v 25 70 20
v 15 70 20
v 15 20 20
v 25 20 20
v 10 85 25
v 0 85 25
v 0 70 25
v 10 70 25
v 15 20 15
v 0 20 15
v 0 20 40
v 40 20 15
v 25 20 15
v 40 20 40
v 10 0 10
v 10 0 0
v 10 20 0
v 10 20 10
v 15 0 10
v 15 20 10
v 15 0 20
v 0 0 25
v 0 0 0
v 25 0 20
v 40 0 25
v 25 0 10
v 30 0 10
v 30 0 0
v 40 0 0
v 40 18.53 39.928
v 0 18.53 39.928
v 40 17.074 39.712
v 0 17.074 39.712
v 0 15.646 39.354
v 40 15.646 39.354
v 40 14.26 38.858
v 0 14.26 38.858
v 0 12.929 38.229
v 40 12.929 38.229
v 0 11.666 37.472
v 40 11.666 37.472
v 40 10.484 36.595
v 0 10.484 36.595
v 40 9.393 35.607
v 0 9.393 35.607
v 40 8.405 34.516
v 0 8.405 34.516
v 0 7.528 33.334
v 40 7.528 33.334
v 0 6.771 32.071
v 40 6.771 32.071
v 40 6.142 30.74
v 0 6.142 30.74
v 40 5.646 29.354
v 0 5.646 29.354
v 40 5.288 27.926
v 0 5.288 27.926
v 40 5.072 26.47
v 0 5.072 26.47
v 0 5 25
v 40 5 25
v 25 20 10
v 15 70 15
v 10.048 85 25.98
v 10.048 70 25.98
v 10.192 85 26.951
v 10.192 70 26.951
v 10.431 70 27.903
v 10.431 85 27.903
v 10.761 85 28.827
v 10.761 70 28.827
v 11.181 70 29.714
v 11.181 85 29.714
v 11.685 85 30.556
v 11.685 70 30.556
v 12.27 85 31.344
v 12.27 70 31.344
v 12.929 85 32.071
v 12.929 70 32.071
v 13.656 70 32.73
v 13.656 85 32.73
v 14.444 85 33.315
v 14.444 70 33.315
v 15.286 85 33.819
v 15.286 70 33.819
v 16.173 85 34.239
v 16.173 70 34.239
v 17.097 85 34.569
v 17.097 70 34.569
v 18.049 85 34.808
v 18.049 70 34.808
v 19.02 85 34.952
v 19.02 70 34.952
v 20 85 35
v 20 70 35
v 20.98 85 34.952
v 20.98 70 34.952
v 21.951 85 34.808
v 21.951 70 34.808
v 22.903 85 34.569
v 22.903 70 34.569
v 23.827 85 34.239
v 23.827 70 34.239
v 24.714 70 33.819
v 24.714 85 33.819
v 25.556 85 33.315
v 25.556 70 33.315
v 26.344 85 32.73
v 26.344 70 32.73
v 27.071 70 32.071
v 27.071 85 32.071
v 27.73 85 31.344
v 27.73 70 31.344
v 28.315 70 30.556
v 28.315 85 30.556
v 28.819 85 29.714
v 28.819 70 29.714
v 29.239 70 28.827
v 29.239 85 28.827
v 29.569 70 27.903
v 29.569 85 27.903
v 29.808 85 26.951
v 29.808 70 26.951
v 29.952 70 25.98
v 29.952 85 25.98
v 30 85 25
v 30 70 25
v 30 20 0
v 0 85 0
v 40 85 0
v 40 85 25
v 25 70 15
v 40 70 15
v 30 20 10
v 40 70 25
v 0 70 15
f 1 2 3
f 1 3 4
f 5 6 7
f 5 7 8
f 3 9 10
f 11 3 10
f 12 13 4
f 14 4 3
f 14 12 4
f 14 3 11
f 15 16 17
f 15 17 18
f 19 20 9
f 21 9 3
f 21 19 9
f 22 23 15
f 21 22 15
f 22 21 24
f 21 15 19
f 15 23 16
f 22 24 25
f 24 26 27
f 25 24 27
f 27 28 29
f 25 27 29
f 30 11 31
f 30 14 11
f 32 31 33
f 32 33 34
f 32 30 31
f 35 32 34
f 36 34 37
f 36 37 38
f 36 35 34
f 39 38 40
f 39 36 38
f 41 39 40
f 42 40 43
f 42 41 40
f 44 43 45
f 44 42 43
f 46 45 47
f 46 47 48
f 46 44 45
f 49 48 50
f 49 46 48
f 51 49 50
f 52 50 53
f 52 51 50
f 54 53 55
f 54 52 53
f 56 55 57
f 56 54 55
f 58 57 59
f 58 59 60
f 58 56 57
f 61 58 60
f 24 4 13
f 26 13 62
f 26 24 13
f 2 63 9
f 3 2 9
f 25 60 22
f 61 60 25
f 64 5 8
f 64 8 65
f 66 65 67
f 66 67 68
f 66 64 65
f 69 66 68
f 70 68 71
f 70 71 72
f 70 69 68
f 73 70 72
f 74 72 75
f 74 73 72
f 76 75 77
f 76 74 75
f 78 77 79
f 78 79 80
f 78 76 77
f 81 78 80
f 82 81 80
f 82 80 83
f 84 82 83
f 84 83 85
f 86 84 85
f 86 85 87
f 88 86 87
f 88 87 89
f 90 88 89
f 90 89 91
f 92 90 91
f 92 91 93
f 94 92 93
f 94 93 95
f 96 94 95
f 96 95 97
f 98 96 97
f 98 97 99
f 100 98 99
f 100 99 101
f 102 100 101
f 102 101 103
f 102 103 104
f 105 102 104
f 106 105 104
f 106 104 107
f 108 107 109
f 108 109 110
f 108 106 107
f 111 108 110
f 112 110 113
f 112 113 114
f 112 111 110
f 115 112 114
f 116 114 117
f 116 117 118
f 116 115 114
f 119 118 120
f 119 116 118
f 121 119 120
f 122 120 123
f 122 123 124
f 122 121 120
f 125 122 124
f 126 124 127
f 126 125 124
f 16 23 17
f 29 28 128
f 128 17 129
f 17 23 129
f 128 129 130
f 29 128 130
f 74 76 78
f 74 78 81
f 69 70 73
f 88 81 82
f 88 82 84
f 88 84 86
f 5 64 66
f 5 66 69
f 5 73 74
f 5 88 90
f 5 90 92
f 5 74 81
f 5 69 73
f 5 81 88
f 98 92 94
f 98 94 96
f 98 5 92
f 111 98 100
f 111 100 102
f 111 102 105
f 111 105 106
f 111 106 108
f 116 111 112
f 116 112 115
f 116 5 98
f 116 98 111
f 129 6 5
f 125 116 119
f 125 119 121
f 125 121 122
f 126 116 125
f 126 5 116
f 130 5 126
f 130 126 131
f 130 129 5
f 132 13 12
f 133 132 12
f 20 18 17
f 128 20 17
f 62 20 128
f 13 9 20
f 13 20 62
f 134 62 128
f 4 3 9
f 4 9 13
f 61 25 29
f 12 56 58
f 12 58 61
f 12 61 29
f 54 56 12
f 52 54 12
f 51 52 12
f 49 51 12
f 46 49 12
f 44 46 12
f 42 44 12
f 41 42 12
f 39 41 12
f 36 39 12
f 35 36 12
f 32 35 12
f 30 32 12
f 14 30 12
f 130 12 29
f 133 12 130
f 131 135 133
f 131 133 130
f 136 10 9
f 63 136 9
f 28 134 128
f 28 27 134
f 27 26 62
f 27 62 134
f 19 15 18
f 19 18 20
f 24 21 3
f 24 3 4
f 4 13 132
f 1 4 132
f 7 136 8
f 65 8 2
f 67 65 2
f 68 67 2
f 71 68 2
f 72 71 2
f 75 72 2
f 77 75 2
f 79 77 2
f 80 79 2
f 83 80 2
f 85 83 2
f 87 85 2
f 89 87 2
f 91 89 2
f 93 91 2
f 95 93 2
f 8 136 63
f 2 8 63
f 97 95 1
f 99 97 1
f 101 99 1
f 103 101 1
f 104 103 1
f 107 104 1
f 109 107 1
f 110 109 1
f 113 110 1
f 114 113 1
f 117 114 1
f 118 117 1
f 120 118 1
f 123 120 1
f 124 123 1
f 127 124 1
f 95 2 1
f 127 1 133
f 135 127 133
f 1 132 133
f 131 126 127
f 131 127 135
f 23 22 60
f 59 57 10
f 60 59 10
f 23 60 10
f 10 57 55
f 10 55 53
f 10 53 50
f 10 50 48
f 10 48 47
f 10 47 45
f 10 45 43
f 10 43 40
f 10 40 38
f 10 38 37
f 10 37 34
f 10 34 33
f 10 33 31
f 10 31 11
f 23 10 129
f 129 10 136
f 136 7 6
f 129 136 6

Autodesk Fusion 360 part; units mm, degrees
sketch "Sketch1" plane through (0, 0, 0) normal (0, 0, 1) x (1, 0, 0)
  line L0 (0, 0) -> (40, 0)
  line L1 (0, 0) -> (0, 85)
  line L2 (0, 85) -> (40, 85)
  line L3 (40, 85) -> (40, 0)
  line L4 (0, 0) -> (0, 5)
  line L5 (0, 5) -> (40, 5)
  line L6 (40, 5) -> (40, 0)
  line L7 (0, 5) -> (0, 20)
  line L8 (0, 20) -> (40, 20)
  line L9 (40, 20) -> (40, 5)
  line L10 (0, 85) -> (0, 70)
  line L11 (0, 70) -> (40, 70)
  line L12 (40, 70) -> (40, 85)
  line L13 (0, 70) -> (15, 70)
  line L14 (15, 70) -> (15, 20)
  line L15 (15, 20) -> (25, 20)
  line L16 (15, 20) -> (25, 20)
  line L17 (25, 20) -> (25, 70)
  line L18 (25, 70) -> (15, 70)
extrude "Extrude1" add sketch "Sketch1" along normal blind 25 contours L0 L1 L3 L4 L5 L6 makes body 1
extrude "Extrude2" add sketch "Sketch1" along normal blind 15 separate body contours L1 L8 L11 L13 L14 | L3 L8 L11 L17 makes body 2 at (0, 36.6667, 10) makes body 3 at (25, 36.6667, 10)
extrude "Extrude3" add sketch "Sketch1" along normal blind 20 contours L8 L11 L14 L15 L16 L17 L18 bodies 2 3
extrude "Extrude4" add sketch "Sketch1" along normal blind 25 contours L1 L2 L3 L10 L11 L12 L13 L18 bodies 2
extrude "Extrude5" add sketch "Sketch1" along normal blind 25 contours L1 L3 L5 L7 L8 L9 L15 L16 bodies 1 2
sketch "Sketch2" plane through (0, 0, 25) normal (0, 0, 1) x (-1, 0, 0)
  line L0 (0, 0) -> (-40, 0)
  line L1 (-40, 0) -> (-40, -20)
  line L2 (-40, -20) -> (0, -20)
  line L3 (0, -20) -> (0, 0)
  line L4 (0, -20) -> (0, -5)
  line L5 (-40, -5) -> (-40, -20)
  line L6 (0, -20) -> (-40, -20)
  line L7 (-40, -5) -> (0, -5)
sketch "Sketch3" plane through (40, 0, 0) normal (1, 0, 0) x (0, 1, 0)
  line L0 (0, 0) -> (85, 0)
  line L1 (85, 0) -> (85, 25)
  line L2 (85, 25) -> (70, 25)
  line L3 (70, 25) -> (70, 15)
  line L4 (70, 15) -> (20, 15)
  line L5 (20, 15) -> (20, 25)
  line L6 (20, 25) -> (0, 25)
  line L7 (0, 25) -> (0, 0)
  circle A0 centre (20, 25) radius 15
  line L8 (20, 25) -> (20, 40)
extrude "Extrude6" add sketch "Sketch3" against normal blind 40 contours L6 A0 L8 bodies 1
sketch "Sketch4" plane through (0, 85, 0) normal (0, 1, 0) x (-1, 0, 0)
  line L0 (-40, 0) -> (0, 0)
  line L1 (0, 0) -> (0, 25)
  line L2 (0, 25) -> (-40, 25)
  line L3 (-40, 25) -> (-40, 0)
  circle A0 centre (-20, 25) radius 10
  line L4 (-30, 25) -> (-10, 25)
extrude "Extrude7" add sketch "Sketch4" against normal blind 15 contours L2 A0 L4 picked at (-23.1513, 27.4288) bodies 1
sketch "Sketch5" plane through (0, 0, 0) normal (0, -1, 0) x (1, 0, 0)
  line L0 (0, 0) -> (40, 0)
  line L1 (40, 0) -> (40, 25)
  line L2 (40, 25) -> (0, 25)
  line L3 (0, 25) -> (0, 0)
  line L4 (0, 0) -> (10, 0)
  line L5 (10, 0) -> (10, 10)
  line L6 (10, 10) -> (15, 10)
  line L7 (15, 10) -> (15, 20)
  line L8 (15, 20) -> (25, 20)
  line L9 (25, 20) -> (25, 10)
  line L10 (25, 10) -> (30, 10)
  line L11 (30, 10) -> (30, 0)
  line L12 (30, 0) -> (10, 0)
sketch "Sketch6" plane through (0, 0, 0) normal (0, -1, 0) x (1, 0, 0)
extrude "Extrude8" cut sketch "Sketch5" against normal blind 20 contours L0 L5 L6 L7 L8 L9 L10 L11 L12 bodies 1
